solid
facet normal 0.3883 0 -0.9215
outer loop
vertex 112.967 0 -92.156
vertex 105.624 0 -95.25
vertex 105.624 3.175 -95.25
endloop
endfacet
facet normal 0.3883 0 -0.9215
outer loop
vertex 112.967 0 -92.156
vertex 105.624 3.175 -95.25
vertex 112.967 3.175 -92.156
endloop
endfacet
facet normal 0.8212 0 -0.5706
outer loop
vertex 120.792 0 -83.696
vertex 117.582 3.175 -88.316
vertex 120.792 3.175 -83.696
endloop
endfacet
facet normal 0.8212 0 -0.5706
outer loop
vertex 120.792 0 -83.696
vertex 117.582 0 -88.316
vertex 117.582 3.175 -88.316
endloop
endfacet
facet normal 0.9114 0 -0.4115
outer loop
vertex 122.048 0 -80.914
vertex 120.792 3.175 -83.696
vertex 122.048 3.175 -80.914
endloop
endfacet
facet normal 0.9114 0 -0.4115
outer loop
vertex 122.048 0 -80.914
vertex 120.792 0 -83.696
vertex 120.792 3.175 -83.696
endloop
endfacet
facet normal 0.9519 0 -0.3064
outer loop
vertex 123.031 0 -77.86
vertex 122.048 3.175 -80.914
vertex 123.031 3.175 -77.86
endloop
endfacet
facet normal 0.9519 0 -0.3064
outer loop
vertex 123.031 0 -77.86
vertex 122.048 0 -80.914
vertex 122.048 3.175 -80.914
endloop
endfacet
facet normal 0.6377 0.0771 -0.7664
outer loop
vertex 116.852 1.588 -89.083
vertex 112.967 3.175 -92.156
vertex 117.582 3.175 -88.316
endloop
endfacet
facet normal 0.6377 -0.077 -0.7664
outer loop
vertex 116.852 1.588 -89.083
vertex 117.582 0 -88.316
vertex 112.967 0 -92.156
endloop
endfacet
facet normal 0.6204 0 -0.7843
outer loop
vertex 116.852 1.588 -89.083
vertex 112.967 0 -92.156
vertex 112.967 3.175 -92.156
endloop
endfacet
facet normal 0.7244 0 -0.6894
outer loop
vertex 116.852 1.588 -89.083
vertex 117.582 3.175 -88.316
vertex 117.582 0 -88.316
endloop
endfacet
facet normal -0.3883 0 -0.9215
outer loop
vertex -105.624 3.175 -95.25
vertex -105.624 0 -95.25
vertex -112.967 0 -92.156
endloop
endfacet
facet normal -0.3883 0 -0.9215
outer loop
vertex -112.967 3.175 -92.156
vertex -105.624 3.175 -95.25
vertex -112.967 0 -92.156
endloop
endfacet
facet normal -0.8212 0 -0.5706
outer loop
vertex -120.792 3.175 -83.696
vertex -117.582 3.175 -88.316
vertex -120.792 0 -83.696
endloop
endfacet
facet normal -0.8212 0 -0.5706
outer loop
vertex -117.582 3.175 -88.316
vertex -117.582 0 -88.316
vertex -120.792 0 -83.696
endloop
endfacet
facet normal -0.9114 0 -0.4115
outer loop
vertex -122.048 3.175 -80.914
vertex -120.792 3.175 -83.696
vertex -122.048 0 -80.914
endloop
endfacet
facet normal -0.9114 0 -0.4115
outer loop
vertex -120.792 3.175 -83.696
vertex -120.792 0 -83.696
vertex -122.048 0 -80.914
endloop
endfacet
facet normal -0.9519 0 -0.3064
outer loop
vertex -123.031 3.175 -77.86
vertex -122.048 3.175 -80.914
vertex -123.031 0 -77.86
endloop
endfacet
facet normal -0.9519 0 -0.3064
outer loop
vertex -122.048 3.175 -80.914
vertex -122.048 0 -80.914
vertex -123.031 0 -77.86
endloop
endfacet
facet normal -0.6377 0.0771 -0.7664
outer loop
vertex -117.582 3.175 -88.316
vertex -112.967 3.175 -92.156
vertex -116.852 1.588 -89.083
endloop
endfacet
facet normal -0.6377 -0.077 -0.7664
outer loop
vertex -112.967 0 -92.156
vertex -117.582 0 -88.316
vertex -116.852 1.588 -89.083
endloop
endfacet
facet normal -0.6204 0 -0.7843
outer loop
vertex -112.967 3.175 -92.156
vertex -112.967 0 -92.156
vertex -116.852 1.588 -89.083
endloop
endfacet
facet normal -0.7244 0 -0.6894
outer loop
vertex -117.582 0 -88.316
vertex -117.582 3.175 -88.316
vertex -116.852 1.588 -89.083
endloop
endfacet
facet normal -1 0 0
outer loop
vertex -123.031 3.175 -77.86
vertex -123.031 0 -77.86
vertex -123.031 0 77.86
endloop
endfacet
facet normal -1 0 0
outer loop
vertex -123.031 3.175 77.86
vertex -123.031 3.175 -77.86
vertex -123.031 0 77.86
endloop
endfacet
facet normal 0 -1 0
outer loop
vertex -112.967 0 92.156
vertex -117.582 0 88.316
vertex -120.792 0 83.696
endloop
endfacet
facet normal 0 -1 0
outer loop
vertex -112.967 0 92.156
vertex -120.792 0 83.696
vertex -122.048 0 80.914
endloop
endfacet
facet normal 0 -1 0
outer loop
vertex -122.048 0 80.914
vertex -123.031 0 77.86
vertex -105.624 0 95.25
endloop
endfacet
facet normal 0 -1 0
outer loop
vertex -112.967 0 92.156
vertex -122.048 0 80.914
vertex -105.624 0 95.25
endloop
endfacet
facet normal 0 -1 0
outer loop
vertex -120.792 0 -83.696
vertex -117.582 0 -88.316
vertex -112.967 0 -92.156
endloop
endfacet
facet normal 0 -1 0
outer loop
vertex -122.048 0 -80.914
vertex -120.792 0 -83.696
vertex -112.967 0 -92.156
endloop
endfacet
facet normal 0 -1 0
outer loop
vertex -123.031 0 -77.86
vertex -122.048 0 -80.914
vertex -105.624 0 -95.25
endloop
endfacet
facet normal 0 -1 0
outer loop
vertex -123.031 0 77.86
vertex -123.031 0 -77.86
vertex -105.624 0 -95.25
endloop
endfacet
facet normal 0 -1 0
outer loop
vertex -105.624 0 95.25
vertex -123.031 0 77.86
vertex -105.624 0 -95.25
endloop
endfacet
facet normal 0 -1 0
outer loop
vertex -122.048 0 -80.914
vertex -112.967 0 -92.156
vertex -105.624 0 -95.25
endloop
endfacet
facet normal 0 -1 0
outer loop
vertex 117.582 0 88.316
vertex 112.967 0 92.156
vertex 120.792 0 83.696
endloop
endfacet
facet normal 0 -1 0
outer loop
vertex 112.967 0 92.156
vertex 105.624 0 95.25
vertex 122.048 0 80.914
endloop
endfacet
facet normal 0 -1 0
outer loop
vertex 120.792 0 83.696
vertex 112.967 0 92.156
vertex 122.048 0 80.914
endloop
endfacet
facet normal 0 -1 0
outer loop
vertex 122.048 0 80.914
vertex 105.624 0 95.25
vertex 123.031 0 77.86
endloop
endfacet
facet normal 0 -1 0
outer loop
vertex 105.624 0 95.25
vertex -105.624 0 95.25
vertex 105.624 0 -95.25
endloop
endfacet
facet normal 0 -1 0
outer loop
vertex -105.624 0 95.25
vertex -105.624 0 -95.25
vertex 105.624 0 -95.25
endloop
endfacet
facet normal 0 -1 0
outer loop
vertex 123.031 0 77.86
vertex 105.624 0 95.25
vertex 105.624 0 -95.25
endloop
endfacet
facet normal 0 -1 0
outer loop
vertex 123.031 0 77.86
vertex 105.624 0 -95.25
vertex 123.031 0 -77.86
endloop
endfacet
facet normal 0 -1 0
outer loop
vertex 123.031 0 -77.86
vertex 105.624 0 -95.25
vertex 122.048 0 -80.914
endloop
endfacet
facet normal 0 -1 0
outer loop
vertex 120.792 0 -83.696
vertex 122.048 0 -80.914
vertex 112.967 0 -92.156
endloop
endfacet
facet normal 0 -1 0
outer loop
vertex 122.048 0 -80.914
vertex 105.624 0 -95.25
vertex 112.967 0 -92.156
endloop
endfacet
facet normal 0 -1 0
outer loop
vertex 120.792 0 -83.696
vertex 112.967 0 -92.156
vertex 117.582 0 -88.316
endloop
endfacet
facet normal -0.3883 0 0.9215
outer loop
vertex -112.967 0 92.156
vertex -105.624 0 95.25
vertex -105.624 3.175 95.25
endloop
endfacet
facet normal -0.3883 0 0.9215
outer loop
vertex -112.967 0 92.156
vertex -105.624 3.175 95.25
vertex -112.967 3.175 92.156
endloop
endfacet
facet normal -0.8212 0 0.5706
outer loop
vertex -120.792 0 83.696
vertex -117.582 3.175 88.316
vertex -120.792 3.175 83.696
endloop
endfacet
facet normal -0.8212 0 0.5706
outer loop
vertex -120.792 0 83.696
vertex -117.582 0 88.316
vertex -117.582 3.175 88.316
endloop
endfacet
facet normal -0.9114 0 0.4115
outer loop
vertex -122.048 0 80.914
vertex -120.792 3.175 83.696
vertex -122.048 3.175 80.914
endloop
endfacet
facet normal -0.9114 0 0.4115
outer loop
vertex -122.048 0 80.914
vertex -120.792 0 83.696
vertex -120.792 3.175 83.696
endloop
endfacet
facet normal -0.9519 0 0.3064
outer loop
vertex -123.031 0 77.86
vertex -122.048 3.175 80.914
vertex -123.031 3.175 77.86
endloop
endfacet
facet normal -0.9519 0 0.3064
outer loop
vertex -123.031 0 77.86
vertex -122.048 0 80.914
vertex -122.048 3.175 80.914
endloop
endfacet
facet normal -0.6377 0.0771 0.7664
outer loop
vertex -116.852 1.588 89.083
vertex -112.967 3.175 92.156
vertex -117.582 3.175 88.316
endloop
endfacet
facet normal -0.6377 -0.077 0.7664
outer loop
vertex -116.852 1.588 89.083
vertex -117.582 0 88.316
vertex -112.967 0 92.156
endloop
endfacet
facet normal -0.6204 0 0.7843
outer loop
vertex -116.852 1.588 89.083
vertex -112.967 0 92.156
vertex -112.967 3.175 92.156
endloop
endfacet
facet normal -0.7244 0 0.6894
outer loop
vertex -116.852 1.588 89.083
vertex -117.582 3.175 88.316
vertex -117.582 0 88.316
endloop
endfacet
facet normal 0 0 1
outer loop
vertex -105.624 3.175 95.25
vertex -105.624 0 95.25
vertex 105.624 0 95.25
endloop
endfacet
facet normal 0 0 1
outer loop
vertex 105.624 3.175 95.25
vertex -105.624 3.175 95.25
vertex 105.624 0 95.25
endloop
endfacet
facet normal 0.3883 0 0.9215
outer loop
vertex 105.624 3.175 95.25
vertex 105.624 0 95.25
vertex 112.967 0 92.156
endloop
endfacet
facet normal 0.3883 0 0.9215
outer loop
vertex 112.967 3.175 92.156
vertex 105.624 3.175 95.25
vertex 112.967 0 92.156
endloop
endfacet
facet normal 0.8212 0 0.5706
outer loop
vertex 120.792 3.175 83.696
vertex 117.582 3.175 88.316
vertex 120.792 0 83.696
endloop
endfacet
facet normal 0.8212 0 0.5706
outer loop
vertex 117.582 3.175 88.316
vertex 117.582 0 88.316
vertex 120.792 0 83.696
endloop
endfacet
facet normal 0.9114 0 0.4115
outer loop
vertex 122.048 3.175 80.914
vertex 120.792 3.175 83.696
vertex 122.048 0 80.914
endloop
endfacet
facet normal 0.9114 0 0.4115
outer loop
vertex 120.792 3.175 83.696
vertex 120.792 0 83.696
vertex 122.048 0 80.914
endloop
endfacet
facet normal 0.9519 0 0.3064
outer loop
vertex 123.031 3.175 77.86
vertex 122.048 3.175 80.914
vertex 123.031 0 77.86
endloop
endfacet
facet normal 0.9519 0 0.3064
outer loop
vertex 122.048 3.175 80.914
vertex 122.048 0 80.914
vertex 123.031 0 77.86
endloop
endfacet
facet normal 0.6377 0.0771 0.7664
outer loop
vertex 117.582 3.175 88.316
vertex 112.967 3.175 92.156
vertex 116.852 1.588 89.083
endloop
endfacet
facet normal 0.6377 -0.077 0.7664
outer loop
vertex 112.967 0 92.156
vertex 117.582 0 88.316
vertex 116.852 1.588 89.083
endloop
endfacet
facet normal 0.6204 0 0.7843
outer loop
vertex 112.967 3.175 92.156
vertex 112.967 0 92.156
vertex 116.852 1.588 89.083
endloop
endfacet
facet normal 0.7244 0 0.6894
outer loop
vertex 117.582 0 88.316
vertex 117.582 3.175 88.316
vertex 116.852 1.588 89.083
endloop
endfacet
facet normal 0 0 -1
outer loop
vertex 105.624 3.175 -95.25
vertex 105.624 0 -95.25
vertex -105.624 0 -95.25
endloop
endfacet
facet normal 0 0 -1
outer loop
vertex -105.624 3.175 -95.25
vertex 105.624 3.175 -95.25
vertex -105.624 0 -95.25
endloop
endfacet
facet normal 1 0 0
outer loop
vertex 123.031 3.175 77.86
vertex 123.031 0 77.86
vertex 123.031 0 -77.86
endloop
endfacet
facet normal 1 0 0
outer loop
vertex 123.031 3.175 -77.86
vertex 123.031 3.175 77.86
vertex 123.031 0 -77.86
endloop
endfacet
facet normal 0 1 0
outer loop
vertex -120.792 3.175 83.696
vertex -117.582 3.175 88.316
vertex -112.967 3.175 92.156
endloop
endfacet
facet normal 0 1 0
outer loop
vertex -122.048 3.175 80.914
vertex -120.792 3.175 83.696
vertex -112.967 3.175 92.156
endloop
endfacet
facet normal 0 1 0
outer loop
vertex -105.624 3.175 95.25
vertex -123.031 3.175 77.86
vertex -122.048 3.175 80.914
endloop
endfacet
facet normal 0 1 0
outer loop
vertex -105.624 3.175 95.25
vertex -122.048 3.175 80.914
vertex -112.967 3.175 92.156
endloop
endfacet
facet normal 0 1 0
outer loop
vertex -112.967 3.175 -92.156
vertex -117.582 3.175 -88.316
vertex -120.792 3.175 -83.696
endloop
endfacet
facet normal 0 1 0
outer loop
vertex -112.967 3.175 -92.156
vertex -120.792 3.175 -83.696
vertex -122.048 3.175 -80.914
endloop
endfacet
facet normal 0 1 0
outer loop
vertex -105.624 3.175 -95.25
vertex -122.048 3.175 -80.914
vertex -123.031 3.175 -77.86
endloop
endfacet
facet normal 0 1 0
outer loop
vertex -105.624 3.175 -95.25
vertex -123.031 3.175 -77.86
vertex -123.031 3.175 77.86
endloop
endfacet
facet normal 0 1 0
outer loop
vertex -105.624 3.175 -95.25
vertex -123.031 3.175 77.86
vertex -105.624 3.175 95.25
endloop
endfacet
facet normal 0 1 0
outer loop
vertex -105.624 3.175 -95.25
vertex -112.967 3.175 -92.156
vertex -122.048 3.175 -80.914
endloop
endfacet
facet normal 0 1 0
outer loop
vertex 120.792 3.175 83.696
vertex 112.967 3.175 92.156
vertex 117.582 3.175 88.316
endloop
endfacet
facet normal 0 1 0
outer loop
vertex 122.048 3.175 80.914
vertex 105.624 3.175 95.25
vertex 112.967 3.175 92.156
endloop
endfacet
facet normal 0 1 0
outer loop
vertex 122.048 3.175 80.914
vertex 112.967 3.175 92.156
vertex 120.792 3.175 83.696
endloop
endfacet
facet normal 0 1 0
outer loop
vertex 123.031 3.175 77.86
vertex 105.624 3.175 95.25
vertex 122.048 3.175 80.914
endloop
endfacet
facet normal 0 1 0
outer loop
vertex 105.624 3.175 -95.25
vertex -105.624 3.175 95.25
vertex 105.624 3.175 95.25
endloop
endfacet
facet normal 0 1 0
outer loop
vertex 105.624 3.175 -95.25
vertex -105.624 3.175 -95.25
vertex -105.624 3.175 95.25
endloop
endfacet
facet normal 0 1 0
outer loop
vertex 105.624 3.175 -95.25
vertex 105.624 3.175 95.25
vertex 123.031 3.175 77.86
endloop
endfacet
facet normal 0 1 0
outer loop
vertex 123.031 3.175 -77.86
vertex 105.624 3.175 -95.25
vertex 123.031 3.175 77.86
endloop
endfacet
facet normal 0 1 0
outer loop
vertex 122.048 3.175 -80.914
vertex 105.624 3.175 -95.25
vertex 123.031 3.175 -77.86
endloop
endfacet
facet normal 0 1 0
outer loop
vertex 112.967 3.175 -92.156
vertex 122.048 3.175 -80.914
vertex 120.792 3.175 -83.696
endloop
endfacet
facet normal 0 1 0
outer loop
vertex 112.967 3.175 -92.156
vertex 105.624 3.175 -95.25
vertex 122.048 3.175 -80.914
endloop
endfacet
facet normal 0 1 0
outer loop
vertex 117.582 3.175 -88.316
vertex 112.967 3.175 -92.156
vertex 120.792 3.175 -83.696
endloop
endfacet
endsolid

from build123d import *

# Parameters (mm, degrees)
BOSS_EXTRUDE1_DEPTH = 3.175


with BuildPart() as part:
    # Sketch1 → Boss-Extrude1 (new body)
    with BuildSketch(Plane(origin=(0, 0, 0), x_dir=(1, 0, 0), z_dir=(0, 1, 0))):
        with BuildLine():
            Line((123.03125, -77.8604715), (123.03125, 77.8604715))
            add(Edge.make_bspline(
                [(105.623942912, 95.25), (119.376750647, 91.610533651), (123.03125, 77.8604715)],
                knots=[0, 0, 0, 1, 1, 1], degree=2))
            Line((105.623942912, 95.25), (-105.623942912, 95.25))
            add(Edge.make_bspline(
                [(-105.623942912, 95.25), (-119.376750647, 91.610533651), (-123.03125, 77.8604715)],
                knots=[0, 0, 0, 1, 1, 1], degree=2))
            Line((-123.03125, 77.8604715), (-123.03125, -77.8604715))
            add(Edge.make_bspline(
                [(-105.623942912, -95.25), (-119.376750647, -91.610533651), (-123.03125, -77.8604715)],
                knots=[0, 0, 0, 1, 1, 1], degree=2))
            Line((-105.623942912, -95.25), (105.623942912, -95.25))
            add(Edge.make_bspline(
                [(105.623942912, -95.25), (119.376750647, -91.610533651), (123.03125, -77.8604715)],
                knots=[0, 0, 0, 1, 1, 1], degree=2))
        make_face()
    extrude(amount=BOSS_EXTRUDE1_DEPTH)


solid = part.part
